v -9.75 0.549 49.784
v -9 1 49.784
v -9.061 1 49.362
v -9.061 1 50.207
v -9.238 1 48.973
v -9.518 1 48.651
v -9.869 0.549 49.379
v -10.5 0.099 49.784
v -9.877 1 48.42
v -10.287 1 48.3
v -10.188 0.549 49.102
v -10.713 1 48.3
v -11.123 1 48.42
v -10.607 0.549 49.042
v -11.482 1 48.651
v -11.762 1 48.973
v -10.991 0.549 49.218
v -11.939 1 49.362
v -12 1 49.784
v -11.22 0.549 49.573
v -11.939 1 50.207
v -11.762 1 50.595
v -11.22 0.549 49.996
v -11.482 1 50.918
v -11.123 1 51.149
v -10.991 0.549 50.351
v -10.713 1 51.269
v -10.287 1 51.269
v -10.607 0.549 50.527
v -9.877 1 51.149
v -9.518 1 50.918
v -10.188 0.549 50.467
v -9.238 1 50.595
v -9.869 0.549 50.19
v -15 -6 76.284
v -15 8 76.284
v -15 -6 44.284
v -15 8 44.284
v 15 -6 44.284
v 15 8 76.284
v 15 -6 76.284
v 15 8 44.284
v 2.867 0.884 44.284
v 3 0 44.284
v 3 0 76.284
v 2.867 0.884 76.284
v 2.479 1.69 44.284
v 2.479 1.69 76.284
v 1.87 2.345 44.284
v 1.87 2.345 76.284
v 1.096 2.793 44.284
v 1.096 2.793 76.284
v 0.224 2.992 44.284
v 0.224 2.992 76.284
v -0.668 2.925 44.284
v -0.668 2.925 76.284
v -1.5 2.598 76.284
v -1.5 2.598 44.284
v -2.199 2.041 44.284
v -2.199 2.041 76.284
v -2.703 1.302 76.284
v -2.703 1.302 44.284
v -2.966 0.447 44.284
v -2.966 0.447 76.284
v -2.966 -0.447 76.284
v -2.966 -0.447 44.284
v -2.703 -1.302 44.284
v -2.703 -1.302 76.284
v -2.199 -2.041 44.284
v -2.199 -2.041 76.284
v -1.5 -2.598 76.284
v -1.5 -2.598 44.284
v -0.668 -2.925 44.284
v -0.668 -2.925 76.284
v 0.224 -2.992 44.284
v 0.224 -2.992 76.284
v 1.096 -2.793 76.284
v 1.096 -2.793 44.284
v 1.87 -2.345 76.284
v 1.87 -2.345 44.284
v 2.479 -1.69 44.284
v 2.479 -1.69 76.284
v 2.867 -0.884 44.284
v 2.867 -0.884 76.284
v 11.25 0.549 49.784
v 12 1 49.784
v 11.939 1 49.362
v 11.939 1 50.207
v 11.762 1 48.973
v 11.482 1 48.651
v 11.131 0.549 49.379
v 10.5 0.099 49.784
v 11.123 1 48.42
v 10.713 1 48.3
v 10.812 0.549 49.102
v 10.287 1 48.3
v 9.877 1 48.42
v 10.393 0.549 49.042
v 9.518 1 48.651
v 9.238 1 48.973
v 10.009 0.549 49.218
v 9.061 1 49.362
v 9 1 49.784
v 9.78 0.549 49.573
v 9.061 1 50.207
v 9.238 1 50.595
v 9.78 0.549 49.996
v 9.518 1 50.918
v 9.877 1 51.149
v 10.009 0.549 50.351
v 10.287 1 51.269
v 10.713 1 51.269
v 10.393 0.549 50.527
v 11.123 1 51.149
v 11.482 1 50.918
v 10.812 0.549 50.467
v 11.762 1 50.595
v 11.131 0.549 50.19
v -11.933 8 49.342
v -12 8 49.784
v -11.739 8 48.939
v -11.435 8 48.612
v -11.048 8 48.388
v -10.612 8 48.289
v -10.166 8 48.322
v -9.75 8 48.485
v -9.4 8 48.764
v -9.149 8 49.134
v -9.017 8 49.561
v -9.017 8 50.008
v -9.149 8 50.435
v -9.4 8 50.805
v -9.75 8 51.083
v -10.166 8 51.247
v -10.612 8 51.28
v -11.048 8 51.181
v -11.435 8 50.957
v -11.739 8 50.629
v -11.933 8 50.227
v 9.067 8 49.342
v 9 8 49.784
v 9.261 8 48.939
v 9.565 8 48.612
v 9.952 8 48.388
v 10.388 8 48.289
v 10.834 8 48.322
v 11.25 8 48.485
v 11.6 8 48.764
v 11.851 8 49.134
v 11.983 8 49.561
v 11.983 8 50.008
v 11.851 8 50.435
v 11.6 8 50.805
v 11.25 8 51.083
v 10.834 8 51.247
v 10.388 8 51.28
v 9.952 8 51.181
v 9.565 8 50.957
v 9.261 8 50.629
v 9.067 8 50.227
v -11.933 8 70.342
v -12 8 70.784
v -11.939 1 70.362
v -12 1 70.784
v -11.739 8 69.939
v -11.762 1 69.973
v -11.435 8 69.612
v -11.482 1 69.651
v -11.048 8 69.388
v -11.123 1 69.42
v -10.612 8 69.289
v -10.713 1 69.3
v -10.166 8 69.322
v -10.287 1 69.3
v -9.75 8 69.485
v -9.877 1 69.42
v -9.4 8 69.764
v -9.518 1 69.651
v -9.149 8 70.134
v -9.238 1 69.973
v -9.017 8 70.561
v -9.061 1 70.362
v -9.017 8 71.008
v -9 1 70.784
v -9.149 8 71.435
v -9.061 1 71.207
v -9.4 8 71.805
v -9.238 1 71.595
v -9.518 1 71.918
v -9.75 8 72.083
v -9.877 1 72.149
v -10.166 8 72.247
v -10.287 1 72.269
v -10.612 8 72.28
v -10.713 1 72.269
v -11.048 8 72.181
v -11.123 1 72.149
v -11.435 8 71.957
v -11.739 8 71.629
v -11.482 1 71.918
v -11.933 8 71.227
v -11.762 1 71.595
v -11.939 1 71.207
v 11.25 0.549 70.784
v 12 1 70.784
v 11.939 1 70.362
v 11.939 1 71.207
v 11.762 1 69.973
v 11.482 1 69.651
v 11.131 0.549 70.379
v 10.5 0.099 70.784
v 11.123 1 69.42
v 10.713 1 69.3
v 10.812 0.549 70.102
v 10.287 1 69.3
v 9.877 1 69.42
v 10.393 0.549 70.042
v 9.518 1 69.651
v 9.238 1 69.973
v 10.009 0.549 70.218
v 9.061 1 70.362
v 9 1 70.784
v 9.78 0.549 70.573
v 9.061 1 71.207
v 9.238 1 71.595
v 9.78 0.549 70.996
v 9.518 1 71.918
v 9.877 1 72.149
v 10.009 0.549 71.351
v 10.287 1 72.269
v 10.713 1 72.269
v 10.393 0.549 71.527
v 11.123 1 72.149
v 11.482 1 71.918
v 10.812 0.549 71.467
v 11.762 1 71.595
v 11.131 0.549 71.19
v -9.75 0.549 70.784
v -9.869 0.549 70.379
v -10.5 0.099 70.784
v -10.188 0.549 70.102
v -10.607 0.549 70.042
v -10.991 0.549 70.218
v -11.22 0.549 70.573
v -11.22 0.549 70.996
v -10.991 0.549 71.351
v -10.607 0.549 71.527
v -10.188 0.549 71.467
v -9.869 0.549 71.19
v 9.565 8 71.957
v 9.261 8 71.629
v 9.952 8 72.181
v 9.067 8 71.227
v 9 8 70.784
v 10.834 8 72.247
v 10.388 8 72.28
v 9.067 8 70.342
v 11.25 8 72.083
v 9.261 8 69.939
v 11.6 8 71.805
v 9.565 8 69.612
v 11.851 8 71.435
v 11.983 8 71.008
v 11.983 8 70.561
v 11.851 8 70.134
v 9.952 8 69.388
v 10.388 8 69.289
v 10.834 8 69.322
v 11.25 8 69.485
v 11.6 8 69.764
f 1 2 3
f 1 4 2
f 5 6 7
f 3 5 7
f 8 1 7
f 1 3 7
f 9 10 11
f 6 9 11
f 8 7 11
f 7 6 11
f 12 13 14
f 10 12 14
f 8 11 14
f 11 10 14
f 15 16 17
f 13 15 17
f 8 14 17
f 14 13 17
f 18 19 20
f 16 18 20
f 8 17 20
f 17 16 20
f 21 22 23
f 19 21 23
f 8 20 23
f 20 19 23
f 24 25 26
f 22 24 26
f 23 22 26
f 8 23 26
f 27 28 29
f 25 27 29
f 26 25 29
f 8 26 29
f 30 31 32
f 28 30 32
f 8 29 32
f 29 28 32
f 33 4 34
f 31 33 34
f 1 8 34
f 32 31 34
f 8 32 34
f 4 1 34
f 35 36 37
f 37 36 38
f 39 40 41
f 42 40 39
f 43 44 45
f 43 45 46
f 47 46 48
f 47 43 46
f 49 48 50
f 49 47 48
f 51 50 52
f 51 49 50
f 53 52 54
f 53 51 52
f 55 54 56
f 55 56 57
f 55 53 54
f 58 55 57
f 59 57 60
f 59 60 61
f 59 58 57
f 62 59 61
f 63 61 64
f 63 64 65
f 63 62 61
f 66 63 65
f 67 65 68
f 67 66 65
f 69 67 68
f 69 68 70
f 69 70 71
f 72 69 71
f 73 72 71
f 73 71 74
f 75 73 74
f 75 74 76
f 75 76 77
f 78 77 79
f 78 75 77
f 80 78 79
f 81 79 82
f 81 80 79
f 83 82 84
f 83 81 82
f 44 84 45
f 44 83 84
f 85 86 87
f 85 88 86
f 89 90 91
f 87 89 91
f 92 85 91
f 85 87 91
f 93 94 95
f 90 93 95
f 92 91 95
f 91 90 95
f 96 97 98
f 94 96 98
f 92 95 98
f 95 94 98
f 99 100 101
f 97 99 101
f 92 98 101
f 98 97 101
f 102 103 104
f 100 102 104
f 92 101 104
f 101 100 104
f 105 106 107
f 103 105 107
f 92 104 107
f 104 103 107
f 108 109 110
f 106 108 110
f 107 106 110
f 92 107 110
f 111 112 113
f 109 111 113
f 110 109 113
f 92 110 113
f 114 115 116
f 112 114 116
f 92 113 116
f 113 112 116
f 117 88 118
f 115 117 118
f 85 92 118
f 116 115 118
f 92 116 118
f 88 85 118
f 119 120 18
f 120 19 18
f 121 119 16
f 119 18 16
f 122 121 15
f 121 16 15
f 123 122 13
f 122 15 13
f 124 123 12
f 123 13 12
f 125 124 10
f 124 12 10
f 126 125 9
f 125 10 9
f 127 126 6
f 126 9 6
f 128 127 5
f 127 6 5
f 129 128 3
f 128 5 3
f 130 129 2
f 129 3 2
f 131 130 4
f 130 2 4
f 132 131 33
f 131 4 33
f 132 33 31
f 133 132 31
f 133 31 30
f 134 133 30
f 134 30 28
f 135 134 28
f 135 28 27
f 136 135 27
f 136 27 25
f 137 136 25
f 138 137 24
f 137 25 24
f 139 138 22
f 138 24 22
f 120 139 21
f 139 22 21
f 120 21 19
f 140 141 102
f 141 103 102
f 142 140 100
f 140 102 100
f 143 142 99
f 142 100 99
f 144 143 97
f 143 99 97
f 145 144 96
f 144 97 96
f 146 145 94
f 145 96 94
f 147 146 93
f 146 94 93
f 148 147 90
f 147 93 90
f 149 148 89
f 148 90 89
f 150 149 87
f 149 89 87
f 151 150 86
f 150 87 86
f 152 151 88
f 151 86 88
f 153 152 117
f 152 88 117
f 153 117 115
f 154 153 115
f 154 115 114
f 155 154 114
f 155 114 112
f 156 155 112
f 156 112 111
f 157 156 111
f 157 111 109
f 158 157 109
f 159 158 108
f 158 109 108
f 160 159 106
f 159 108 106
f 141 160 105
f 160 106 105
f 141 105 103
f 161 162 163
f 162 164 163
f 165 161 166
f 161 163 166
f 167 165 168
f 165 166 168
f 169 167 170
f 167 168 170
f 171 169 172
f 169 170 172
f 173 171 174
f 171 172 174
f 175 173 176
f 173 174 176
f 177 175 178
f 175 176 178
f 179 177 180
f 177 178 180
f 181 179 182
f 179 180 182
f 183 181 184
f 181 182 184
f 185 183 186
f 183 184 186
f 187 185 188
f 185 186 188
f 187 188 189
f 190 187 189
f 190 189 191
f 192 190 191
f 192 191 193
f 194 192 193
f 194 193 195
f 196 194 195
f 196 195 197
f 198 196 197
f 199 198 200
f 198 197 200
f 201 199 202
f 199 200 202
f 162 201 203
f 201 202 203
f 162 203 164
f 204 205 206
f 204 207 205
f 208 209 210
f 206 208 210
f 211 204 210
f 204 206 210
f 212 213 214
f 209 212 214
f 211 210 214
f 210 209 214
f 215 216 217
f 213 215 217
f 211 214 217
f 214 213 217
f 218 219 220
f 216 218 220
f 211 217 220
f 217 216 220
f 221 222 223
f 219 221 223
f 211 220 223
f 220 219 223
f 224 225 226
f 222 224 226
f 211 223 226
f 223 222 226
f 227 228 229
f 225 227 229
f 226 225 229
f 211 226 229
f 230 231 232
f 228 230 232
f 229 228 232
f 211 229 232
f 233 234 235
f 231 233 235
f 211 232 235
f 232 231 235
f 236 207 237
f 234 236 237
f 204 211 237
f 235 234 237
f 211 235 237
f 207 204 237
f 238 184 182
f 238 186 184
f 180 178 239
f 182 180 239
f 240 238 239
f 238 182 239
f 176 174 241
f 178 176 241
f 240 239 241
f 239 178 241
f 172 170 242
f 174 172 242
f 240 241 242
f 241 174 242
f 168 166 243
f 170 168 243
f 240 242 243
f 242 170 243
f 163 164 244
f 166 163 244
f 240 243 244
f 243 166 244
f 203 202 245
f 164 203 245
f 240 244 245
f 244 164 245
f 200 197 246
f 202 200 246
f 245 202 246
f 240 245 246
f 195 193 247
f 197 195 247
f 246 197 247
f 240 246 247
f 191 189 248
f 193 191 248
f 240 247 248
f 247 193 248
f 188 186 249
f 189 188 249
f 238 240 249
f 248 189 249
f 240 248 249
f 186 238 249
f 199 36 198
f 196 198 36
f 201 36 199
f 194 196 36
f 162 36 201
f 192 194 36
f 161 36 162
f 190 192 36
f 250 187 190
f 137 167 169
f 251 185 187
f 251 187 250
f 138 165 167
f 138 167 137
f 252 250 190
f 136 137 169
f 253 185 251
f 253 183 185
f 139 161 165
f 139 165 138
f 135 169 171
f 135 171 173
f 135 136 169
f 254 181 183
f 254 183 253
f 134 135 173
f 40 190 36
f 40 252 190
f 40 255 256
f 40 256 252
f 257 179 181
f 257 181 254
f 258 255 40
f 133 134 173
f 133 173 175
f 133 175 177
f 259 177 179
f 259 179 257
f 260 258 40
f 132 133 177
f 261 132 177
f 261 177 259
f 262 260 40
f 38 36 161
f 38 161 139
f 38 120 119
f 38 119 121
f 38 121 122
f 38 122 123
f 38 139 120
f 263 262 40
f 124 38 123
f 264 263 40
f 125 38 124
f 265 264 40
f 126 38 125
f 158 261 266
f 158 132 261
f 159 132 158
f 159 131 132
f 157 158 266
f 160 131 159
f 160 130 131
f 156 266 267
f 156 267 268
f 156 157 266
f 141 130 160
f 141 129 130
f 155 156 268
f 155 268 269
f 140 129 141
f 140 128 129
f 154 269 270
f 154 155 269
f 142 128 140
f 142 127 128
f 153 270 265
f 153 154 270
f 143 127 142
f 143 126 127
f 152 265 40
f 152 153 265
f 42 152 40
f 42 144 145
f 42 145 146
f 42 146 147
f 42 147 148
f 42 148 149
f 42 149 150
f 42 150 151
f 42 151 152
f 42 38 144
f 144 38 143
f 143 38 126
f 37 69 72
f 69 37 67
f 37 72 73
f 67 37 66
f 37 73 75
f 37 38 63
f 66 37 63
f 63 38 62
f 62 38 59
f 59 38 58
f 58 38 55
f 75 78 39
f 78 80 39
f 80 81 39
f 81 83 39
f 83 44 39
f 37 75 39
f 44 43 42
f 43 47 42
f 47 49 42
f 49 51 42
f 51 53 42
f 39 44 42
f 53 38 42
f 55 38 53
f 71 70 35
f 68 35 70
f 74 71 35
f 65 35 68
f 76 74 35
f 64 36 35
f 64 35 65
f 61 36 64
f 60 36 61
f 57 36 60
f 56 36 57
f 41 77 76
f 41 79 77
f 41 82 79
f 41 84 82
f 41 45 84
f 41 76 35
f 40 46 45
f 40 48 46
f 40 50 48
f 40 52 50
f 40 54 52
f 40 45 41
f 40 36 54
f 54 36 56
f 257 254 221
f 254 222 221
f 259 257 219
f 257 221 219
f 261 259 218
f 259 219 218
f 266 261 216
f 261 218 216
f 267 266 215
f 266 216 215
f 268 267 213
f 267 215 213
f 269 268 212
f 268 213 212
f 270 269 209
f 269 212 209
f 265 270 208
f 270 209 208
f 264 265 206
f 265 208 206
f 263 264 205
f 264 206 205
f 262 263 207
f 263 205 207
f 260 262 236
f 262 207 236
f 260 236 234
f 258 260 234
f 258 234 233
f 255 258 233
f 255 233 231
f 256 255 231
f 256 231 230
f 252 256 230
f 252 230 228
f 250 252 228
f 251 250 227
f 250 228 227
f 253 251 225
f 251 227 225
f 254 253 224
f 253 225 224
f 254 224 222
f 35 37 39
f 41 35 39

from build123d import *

# Parameters (mm, degrees)
SKETCH1_W                = 30
SKETCH1_H                = 32
BOSS_EXTRUDE1_DEPTH      = 14
CAVITY1_START            = 44.284378121
CAVITY1_OUTLINE_R        = 3
CAVITY1_DEPTH            = 32
M3_CLEARANCE_HOLE1_D     = 3
M3_CLEARANCE_HOLE1_DEPTH = 7
M3_CLEARANCE_HOLE1_TIP   = 0.901290929


# Read off the part's stored shape, not the designer's step: Cavity1
with BuildPart() as part:
    # Sketch1 → Boss-Extrude1 (new body)
    with BuildSketch(Plane(origin=(0, 8, 0), x_dir=(1, 0, 0), z_dir=(0, 1, 0))):
        with Locations((0, -60.284378121)):
            Rectangle(SKETCH1_W, SKETCH1_H)
    extrude(amount=-BOSS_EXTRUDE1_DEPTH)

    # Cavity1 outline → Cavity1 (cut)
    with BuildSketch(Plane.XY.offset(CAVITY1_START)):
        Circle(CAVITY1_OUTLINE_R)
    extrude(amount=CAVITY1_DEPTH, mode=Mode.SUBTRACT)

    # M3 Clearance Hole1
    with Locations(Plane(origin=(0, 8, 0), x_dir=(1, 0, 0), z_dir=(0, 1, 0))):
        with Locations((10.5, -49.784378121), (-10.5, -49.784378121), (-10.5, -70.784378121), (10.5, -70.784378121)):
            Hole(M3_CLEARANCE_HOLE1_D / 2, depth=M3_CLEARANCE_HOLE1_DEPTH)
            with Locations((0, 0, -(M3_CLEARANCE_HOLE1_DEPTH + M3_CLEARANCE_HOLE1_TIP / 2))):  # 118° drill point
                Cone(0, M3_CLEARANCE_HOLE1_D / 2, M3_CLEARANCE_HOLE1_TIP, mode=Mode.SUBTRACT)


solid = part.part
